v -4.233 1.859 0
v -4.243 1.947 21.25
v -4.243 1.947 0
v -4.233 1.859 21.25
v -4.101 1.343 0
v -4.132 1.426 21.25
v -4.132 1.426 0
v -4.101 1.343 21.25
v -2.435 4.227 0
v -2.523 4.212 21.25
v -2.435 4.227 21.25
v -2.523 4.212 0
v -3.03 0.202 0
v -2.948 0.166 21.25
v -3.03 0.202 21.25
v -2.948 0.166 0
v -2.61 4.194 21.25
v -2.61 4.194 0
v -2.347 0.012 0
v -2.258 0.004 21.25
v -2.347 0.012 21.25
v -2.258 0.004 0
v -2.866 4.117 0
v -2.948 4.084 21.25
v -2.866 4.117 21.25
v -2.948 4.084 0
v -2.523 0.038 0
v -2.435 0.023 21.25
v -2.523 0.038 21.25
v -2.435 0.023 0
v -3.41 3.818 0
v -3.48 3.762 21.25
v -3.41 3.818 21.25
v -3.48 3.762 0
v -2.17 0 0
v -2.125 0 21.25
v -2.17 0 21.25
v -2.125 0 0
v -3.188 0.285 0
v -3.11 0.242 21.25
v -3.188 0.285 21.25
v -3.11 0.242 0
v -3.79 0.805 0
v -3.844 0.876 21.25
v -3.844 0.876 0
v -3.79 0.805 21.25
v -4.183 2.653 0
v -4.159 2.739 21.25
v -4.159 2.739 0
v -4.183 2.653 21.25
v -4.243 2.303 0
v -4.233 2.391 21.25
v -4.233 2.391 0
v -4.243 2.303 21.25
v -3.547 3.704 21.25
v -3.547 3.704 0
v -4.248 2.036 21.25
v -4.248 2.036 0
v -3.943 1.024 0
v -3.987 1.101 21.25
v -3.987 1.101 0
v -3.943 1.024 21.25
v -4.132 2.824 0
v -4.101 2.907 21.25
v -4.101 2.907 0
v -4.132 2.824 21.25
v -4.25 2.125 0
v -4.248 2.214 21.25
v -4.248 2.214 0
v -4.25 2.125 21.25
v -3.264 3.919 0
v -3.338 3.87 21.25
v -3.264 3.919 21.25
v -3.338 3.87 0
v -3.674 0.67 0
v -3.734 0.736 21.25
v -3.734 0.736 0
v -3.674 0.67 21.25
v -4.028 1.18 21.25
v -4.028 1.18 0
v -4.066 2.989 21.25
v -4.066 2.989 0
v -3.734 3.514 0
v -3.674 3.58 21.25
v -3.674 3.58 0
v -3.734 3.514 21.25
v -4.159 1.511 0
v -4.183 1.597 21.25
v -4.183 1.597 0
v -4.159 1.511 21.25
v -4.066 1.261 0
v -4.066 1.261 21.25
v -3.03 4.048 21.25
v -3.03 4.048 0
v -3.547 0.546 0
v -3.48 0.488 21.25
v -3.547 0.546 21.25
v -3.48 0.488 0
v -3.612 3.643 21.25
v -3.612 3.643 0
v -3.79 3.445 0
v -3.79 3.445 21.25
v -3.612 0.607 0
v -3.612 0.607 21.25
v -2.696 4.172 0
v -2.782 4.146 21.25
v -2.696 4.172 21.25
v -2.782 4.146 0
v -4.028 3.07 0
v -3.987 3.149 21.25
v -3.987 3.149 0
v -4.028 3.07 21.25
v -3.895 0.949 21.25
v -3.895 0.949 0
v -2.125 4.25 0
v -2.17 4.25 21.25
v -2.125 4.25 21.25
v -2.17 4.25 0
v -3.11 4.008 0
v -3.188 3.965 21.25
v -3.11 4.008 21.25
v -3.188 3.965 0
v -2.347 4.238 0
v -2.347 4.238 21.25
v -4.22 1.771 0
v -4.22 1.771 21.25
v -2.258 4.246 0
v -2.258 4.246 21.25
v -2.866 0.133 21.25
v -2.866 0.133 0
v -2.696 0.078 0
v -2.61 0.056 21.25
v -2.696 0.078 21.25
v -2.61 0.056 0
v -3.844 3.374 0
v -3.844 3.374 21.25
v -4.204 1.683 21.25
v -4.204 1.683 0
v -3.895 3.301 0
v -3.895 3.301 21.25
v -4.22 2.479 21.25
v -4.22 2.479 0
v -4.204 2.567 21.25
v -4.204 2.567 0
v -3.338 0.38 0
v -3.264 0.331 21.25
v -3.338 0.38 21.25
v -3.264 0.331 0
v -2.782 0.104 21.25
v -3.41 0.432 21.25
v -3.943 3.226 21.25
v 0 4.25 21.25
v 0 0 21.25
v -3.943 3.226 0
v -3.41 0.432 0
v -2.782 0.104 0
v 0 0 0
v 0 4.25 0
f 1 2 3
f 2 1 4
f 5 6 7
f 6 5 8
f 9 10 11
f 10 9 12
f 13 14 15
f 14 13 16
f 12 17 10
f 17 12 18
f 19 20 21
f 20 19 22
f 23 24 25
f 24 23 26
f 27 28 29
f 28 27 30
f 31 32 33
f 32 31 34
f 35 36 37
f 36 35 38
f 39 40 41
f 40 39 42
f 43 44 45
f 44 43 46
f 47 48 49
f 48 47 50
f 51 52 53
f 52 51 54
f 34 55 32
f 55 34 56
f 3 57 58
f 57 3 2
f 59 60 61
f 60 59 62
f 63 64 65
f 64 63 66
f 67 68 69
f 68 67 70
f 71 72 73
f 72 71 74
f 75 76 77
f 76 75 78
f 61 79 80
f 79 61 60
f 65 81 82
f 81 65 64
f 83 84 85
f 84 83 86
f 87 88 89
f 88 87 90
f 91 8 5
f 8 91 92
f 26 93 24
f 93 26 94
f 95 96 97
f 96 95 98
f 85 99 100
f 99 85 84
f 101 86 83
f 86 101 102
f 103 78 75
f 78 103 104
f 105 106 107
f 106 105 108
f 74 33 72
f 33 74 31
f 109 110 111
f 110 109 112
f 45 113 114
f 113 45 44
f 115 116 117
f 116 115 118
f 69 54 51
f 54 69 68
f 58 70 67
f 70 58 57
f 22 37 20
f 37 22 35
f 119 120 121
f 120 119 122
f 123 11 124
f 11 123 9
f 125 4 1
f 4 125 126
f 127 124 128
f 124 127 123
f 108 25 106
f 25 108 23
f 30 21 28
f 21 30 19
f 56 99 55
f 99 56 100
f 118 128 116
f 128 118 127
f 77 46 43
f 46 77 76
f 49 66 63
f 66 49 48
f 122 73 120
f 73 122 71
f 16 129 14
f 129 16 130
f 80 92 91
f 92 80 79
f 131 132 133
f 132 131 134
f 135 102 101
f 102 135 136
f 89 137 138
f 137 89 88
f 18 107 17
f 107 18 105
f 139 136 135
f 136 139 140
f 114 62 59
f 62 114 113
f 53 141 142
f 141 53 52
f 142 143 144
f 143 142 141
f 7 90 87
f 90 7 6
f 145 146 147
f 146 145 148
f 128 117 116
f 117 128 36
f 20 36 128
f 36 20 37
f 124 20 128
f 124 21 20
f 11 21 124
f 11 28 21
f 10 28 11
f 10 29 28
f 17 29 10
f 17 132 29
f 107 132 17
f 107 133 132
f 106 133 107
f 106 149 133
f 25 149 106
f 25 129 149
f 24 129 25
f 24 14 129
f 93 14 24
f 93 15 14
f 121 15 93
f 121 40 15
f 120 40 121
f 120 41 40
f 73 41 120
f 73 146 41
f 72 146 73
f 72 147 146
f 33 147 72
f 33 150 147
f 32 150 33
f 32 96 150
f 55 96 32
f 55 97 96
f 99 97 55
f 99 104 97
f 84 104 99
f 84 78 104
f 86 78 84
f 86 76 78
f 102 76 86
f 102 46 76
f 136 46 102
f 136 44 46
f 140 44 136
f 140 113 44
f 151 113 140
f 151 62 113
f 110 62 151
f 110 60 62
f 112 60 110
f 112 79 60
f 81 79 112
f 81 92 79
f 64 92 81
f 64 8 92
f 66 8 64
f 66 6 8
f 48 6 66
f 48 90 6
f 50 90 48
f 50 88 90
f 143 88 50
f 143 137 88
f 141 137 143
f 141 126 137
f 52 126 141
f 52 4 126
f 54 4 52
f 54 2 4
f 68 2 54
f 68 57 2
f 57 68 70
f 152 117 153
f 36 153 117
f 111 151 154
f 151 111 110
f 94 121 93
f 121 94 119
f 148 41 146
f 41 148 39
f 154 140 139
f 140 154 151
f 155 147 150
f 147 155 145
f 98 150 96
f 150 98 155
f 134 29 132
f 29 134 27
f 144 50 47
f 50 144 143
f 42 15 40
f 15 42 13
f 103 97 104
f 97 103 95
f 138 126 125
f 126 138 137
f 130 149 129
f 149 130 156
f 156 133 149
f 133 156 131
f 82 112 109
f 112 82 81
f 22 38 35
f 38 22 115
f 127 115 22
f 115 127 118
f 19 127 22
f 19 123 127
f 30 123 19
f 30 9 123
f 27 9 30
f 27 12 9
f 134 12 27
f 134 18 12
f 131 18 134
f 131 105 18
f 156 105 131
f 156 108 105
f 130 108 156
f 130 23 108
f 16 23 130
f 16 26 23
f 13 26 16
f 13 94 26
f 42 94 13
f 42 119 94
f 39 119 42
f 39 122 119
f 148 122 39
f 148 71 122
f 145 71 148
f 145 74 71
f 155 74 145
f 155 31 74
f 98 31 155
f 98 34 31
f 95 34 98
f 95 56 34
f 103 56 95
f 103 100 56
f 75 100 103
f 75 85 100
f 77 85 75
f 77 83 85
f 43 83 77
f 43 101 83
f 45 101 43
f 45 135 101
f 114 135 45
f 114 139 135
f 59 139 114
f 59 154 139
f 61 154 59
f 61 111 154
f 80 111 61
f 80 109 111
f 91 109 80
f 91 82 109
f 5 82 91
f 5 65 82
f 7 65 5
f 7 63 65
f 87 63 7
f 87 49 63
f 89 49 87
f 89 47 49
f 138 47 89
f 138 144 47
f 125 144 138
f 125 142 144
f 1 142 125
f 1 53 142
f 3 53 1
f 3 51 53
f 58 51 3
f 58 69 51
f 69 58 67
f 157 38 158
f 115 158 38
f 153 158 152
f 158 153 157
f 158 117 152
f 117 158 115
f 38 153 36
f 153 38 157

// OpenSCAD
$fn = 150;

rotate(a = [0, -90, 0]) {
	union() {
		translate(v = [0, 2.125, 2.125]) {
			rotate(a = [0, 90, 0]) {
				cylinder(d = 4.25, h = 21.25);
			}
		}
		cube(size = [21.25, 4.25, 2.125]);
	}
}
